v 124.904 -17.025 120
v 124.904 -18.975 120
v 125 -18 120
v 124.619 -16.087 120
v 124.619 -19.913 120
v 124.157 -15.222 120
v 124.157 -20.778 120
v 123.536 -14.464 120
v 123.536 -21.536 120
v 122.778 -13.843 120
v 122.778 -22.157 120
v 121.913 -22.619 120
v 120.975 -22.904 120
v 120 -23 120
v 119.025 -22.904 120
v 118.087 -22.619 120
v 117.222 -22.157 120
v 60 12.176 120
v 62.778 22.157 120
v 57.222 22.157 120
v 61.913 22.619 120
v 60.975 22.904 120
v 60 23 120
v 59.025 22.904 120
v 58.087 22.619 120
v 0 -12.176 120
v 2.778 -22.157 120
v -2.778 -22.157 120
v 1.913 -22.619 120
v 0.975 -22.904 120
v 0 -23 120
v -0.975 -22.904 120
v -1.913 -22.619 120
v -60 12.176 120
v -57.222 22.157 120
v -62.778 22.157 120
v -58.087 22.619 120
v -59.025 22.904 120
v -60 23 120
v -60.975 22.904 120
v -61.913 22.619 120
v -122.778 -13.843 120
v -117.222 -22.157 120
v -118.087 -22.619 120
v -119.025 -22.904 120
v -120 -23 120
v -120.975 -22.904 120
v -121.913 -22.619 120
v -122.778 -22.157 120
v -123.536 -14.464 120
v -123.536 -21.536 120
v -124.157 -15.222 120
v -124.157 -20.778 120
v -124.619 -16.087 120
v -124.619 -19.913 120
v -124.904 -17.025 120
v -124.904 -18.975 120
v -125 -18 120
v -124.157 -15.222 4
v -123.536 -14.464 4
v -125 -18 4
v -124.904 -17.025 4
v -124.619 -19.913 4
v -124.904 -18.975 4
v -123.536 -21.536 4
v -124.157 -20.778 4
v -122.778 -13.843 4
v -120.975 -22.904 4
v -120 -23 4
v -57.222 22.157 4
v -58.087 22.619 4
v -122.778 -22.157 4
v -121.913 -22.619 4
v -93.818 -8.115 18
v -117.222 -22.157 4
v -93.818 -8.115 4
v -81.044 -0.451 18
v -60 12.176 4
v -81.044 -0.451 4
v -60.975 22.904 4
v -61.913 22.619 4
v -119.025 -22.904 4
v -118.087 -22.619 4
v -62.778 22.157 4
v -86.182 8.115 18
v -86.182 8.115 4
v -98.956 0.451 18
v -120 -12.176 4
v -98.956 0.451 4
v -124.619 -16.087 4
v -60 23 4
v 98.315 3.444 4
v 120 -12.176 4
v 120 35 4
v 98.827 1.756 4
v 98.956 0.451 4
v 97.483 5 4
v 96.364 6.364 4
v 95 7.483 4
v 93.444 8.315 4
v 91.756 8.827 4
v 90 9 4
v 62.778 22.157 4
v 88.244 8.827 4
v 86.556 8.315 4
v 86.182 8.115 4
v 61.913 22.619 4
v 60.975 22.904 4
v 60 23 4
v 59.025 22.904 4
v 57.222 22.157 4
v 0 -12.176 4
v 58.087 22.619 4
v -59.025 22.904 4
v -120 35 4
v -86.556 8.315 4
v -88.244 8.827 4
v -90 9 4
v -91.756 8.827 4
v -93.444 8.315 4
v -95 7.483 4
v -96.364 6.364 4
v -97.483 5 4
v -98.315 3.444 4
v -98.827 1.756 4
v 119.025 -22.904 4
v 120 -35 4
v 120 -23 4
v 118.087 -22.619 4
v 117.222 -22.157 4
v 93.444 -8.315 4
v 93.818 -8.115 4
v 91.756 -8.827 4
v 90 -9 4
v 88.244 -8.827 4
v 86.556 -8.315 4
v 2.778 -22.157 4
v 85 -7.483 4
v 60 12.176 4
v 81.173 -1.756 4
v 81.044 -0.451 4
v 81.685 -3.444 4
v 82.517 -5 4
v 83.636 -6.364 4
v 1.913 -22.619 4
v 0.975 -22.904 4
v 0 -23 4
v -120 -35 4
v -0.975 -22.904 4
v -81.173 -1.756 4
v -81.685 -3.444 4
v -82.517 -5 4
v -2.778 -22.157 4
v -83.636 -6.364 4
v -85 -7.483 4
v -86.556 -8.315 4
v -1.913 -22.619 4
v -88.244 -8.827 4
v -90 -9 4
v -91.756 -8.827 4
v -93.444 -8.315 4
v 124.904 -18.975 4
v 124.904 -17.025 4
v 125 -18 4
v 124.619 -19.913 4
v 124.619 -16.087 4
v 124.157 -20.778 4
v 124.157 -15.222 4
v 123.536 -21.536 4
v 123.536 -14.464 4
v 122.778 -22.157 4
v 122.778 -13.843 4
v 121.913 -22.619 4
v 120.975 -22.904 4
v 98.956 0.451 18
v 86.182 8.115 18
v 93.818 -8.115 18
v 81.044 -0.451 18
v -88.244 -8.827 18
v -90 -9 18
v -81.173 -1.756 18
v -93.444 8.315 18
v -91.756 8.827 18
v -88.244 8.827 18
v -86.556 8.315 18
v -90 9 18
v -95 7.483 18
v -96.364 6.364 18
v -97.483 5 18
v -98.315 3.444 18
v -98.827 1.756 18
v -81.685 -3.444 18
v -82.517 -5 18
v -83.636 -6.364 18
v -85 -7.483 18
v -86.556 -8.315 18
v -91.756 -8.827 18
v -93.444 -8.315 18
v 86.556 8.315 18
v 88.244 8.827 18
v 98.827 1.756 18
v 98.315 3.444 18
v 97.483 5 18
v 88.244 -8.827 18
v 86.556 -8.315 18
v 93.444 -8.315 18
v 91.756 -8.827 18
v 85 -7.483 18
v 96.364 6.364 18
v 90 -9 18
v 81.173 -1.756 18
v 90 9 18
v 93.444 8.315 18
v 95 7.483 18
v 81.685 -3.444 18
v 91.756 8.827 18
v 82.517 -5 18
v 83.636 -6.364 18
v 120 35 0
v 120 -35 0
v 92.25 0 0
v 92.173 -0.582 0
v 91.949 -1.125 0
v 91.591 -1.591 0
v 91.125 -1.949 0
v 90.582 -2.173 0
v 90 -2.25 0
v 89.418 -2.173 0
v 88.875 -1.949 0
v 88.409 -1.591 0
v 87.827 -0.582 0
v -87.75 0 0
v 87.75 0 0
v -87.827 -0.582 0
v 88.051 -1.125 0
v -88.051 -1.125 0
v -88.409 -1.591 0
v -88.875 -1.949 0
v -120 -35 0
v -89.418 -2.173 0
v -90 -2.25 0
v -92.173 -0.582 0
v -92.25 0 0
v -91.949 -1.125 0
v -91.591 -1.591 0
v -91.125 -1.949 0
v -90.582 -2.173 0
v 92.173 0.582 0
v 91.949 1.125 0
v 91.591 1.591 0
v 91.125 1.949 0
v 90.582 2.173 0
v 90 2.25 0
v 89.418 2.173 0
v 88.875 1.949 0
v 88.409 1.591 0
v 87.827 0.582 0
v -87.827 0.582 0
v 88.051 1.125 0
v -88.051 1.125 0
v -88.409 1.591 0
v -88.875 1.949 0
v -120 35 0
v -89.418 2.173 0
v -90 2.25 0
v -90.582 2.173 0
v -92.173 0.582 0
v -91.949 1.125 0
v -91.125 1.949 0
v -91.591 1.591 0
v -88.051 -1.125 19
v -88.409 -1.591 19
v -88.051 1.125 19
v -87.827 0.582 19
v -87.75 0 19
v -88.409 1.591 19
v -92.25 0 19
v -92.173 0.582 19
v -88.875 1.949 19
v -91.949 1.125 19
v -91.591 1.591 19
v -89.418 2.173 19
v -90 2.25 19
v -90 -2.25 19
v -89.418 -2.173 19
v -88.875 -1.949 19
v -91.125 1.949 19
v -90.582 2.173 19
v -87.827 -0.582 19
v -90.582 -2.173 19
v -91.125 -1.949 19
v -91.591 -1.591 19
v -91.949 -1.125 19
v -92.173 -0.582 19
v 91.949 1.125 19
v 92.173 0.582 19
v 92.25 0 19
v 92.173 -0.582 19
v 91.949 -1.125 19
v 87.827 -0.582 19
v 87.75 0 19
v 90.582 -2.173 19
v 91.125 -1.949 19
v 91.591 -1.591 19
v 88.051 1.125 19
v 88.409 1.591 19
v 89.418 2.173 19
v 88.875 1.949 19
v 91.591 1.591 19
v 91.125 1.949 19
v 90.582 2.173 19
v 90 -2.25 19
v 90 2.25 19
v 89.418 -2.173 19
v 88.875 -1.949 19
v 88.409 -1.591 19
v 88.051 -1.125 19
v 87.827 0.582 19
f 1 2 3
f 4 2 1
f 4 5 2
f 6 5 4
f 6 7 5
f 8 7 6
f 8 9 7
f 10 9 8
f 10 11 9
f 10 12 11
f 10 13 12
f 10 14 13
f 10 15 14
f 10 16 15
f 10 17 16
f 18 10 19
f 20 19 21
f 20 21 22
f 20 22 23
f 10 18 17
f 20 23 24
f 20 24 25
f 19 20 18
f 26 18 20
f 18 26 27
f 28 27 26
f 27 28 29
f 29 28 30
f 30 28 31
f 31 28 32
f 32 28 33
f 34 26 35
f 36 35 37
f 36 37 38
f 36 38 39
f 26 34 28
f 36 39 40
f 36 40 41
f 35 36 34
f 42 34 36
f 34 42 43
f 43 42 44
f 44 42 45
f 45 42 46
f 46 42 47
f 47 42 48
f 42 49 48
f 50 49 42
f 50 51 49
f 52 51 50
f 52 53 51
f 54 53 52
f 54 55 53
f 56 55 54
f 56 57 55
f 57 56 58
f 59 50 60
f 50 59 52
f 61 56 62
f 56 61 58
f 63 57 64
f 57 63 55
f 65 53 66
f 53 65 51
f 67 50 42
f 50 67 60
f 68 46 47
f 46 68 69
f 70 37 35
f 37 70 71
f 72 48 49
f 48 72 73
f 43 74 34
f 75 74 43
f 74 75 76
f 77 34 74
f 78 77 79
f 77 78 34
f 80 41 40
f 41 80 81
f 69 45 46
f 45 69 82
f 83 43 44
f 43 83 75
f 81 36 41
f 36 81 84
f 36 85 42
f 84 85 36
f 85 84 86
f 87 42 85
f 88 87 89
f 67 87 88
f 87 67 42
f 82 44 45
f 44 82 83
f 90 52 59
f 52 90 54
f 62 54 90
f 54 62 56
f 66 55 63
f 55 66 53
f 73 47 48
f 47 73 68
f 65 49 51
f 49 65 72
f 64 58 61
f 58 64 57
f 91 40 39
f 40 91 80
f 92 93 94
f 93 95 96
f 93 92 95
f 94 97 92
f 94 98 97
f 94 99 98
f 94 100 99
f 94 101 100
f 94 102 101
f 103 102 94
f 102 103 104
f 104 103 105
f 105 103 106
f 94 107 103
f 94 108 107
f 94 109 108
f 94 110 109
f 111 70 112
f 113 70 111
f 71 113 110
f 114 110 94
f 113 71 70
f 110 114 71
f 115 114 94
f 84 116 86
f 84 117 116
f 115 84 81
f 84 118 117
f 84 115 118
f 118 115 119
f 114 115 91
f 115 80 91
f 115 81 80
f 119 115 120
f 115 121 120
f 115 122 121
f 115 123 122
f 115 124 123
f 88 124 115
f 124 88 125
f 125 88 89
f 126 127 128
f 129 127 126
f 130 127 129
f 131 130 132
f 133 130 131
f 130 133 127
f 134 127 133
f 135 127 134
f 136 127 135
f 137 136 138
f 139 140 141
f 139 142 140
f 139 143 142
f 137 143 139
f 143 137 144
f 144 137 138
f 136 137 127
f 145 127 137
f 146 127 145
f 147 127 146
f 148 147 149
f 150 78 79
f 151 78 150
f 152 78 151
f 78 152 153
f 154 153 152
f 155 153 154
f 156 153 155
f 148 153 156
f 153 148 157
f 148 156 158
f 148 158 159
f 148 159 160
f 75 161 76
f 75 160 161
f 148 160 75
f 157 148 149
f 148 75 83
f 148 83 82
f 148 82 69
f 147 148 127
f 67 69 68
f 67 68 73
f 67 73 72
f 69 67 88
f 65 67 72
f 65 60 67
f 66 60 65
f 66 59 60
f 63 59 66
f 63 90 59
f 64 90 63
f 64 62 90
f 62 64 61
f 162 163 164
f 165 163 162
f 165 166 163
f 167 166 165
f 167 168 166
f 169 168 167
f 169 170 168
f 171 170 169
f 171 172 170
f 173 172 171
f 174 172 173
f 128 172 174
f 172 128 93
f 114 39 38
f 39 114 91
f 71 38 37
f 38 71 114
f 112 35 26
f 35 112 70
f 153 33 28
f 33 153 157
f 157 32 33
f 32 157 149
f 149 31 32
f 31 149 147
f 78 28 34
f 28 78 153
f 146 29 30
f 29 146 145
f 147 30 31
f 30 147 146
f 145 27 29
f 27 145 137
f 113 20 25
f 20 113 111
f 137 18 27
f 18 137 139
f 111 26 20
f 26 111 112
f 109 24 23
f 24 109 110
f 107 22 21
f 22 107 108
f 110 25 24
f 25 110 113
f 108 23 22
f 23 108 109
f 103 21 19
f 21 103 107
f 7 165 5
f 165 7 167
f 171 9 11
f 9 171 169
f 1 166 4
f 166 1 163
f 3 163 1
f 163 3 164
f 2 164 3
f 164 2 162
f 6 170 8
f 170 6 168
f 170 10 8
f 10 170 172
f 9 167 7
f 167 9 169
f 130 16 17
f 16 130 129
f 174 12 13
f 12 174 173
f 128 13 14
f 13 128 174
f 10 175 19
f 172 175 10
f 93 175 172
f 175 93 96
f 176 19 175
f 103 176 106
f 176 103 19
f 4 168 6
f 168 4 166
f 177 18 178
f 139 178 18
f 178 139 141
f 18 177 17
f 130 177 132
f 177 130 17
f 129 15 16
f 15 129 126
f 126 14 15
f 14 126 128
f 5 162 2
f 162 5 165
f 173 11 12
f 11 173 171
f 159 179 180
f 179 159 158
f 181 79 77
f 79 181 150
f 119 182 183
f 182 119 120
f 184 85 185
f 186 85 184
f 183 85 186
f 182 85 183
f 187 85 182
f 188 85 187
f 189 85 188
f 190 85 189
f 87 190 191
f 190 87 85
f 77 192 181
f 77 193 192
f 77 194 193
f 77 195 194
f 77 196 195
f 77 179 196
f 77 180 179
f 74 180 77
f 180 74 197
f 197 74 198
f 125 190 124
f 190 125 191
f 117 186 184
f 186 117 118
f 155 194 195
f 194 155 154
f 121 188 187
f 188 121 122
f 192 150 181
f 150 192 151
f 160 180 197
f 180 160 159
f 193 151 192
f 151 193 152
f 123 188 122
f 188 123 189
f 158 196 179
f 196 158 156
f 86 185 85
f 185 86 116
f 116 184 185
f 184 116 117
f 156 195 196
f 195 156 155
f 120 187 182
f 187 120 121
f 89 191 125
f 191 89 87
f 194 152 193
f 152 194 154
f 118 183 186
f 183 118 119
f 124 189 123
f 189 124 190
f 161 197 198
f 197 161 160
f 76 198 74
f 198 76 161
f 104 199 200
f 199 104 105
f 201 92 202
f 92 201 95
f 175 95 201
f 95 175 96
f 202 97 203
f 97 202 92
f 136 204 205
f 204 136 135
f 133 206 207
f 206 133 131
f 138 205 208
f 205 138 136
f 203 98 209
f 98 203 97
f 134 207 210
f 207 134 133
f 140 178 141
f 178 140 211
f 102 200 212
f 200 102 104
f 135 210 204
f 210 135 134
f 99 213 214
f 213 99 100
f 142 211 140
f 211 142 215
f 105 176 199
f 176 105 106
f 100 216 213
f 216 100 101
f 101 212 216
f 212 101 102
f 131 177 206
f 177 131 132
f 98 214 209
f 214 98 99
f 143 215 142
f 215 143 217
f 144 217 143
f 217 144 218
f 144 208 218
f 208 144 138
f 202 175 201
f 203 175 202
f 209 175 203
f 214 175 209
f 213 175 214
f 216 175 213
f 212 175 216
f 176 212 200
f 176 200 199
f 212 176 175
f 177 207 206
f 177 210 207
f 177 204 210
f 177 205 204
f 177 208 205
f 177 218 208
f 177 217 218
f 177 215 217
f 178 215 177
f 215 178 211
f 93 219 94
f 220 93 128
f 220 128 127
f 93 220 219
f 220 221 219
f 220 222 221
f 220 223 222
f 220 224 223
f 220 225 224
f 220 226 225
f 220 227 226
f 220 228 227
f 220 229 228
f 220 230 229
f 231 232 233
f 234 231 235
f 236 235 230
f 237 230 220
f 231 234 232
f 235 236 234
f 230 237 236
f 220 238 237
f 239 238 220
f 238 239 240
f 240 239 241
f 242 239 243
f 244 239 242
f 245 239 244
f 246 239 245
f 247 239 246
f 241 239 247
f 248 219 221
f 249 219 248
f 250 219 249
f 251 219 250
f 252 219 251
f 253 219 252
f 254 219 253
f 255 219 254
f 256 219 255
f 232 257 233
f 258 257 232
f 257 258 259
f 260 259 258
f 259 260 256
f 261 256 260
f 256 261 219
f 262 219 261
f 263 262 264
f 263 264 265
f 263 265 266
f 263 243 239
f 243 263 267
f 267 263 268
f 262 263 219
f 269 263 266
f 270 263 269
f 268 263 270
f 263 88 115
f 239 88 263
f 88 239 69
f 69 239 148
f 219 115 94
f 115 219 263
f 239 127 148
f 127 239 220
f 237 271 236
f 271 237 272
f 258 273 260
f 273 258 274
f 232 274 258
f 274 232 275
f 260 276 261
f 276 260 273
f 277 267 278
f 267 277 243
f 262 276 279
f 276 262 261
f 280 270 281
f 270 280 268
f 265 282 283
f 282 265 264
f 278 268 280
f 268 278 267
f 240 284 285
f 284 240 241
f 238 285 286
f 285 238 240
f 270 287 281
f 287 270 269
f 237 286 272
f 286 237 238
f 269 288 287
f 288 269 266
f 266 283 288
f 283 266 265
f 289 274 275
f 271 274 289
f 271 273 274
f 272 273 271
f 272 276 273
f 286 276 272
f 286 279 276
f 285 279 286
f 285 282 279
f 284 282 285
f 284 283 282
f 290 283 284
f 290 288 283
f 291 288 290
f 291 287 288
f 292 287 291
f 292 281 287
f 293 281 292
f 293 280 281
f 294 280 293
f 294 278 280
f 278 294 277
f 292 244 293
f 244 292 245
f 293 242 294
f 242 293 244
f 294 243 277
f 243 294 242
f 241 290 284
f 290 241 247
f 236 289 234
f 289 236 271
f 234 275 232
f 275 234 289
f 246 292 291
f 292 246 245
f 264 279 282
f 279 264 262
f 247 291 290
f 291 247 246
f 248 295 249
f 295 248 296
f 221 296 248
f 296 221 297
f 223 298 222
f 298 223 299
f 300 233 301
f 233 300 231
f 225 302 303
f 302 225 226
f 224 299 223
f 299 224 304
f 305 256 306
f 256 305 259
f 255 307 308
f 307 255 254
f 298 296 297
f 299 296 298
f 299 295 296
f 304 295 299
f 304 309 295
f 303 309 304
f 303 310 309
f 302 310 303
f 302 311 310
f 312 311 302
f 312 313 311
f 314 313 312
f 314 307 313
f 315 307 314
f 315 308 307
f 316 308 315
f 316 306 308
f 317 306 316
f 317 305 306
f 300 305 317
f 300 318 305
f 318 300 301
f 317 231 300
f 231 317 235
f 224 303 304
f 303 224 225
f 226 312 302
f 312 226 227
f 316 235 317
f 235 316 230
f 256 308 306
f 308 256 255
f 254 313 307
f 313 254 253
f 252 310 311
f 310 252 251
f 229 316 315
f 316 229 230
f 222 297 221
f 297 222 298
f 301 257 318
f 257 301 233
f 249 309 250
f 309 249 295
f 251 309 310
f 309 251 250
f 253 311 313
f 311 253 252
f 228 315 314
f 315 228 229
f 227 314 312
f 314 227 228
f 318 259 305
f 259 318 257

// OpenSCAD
wall_length=240; wall_depth=70; wall_height=120; wall_thickness=10; base_thickness=4; mount_hole_diameter=4.5;
module canyon_wall_left() { difference() { union() {
 translate([-wall_length/2,-wall_depth/2,0]) cube([wall_length,wall_depth,base_thickness]);
 for(i=[0:3]) { x1=-wall_length/2+i*wall_length/4; x2=-wall_length/2+(i+1)*wall_length/4; y1=i%2==0?-18:18; y2=(i+1)%2==0?-18:18;
  hull(){ translate([x1,y1,base_thickness]) cylinder(d=wall_thickness,h=wall_height-base_thickness,$fn=32); translate([x2,y2,base_thickness]) cylinder(d=wall_thickness,h=wall_height-base_thickness,$fn=32); }}
 for(x=[-90,90]) translate([x,0,base_thickness]) cylinder(d=18,h=14,$fn=32);
 } for(x=[-90,90]) translate([x,0,-1]) cylinder(d=mount_hole_diameter,h=20,$fn=24); }}
assert(wall_length==240 && wall_depth==70 && wall_height==120); echo("SCADCTL_REQUIREMENT:parameters:PASS"); canyon_wall_left();
